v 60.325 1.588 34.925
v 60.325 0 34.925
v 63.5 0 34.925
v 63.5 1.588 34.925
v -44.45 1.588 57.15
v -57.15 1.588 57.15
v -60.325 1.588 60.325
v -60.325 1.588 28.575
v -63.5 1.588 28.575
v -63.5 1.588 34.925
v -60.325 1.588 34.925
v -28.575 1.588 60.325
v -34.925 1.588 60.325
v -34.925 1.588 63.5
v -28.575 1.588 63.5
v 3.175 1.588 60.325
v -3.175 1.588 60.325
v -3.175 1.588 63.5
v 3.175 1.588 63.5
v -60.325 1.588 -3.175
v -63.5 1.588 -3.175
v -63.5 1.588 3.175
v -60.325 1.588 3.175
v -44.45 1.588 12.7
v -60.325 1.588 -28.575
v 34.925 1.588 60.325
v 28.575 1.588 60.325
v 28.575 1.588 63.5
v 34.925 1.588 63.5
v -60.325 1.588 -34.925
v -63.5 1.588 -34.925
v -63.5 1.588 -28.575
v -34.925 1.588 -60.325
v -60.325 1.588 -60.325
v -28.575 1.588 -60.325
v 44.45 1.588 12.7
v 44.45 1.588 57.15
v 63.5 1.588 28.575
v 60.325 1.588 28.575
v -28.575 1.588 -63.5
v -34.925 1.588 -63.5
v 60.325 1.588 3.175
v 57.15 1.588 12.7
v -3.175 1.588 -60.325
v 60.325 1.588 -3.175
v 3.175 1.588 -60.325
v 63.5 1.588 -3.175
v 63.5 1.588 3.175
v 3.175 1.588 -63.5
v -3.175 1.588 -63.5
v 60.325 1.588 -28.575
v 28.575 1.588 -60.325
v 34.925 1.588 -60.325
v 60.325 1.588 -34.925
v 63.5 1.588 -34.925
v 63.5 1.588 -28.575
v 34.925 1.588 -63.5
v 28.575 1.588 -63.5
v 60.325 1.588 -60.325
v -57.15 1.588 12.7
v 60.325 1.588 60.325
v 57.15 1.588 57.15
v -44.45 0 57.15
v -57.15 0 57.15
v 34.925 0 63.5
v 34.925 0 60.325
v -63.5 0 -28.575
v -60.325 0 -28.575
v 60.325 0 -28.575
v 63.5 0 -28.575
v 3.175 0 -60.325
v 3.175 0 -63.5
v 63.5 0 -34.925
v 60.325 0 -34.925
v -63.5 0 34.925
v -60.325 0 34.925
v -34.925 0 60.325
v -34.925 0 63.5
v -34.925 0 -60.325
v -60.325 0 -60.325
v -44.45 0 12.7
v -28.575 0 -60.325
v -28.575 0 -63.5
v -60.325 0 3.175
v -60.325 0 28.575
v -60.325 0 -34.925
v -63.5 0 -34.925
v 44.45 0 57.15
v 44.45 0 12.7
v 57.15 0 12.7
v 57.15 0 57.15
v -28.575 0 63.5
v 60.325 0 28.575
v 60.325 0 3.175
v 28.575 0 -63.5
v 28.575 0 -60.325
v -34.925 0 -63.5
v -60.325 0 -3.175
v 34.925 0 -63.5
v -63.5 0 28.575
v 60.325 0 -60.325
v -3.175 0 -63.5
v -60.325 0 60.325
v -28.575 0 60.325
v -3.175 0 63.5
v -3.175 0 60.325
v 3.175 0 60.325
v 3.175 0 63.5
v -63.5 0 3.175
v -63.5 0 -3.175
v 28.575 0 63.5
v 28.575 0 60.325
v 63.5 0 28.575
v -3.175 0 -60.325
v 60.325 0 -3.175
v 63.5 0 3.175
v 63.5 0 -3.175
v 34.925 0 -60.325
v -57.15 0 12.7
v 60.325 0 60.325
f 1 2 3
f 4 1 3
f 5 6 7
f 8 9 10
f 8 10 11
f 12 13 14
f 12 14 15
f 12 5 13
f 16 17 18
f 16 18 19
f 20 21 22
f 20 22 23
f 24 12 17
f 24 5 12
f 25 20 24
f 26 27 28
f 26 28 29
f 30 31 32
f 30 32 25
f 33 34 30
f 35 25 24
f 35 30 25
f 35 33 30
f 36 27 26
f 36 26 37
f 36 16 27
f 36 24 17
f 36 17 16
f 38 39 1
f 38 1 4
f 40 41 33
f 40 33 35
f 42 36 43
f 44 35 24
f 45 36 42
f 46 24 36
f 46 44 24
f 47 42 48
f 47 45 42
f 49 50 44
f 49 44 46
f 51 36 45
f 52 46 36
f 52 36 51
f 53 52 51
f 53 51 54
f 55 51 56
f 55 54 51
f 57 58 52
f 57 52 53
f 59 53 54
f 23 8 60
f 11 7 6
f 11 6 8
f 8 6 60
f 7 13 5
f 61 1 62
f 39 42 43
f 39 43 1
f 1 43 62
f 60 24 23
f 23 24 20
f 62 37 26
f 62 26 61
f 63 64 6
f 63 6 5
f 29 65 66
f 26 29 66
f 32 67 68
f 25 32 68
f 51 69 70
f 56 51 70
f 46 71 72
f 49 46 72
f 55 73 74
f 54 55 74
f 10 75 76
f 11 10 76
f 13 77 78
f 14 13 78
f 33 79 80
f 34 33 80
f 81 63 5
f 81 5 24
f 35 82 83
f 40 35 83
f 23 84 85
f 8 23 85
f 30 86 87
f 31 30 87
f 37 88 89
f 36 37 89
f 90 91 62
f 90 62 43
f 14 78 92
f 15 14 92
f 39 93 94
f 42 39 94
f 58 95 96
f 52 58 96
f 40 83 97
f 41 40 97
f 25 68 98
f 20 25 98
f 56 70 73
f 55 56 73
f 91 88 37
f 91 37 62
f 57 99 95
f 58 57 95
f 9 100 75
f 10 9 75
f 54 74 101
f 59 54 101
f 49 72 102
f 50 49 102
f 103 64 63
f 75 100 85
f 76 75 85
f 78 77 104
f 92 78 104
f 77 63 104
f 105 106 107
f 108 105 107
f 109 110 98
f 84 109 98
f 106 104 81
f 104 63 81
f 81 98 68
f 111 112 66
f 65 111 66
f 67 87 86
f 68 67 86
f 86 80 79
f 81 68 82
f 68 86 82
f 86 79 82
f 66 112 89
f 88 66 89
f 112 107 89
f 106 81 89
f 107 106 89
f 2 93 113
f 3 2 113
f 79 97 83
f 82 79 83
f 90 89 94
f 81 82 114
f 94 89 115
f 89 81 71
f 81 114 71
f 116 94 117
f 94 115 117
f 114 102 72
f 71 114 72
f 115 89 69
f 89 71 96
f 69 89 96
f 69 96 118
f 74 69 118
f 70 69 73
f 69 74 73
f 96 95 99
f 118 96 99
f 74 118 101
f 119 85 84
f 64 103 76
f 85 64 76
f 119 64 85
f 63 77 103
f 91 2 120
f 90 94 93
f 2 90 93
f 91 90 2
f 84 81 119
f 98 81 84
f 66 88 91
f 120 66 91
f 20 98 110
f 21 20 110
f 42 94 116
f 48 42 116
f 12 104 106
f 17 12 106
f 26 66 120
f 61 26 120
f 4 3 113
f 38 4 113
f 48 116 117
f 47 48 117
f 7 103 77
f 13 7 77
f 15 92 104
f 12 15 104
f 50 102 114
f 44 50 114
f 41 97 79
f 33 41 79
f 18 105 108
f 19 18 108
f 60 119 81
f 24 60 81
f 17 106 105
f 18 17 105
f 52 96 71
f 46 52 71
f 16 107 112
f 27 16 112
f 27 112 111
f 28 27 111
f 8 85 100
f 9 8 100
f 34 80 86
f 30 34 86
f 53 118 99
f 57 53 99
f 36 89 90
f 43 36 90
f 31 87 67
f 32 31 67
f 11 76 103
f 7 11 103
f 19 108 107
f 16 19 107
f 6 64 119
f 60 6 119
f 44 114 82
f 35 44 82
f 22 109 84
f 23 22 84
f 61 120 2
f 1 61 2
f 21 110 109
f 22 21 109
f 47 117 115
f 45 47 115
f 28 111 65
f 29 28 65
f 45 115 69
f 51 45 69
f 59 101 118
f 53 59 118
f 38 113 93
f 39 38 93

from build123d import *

# Parameters (mm, degrees)
SKETCH1_W           = 12.7
SKETCH1_H           = 44.45
BOSS_EXTRUDE1_DEPTH = 1.5875


with BuildPart() as part:
    # Sketch1 → Boss-Extrude1 (new body)
    with BuildSketch(Plane(origin=(0, 0, 0), x_dir=(1, 0, 0), z_dir=(0, 1, 0))):
        Polygon((3.175, 63.5), (-3.175, 63.5), (-3.175, 60.325), (-28.575, 60.325), (-28.575, 63.5), (-34.925, 63.5), (-34.925, 60.325), (-60.325, 60.325), (-60.325, 34.925), (-63.5, 34.925), (-63.5, 28.575), (-60.325, 28.575), (-60.325, 3.175), (-63.5, 3.175), (-63.5, -3.175), (-60.325, -3.175), (-60.325, -28.575), (-63.5, -28.575), (-63.5, -34.925), (-60.325, -34.925), (-60.325, -60.325), (-34.925, -60.325), (-34.925, -63.5), (-28.575, -63.5), (-28.575, -60.325), (-3.175, -60.325), (-3.175, -63.5), (3.175, -63.5), (3.175, -60.325), (28.575, -60.325), (28.575, -63.5), (34.925, -63.5), (34.925, -60.325), (60.325, -60.325), (60.325, -34.925), (63.5, -34.925), (63.5, -28.575), (60.325, -28.575), (60.325, -3.175), (63.5, -3.175), (63.5, 3.175), (60.325, 3.175), (60.325, 28.575), (63.5, 28.575), (63.5, 34.925), (60.325, 34.925), (60.325, 60.325), (34.925, 60.325), (34.925, 63.5), (28.575, 63.5), (28.575, 60.325), (3.175, 60.325), align=None)
        with Locations((50.8, -34.925)):
            Rectangle(SKETCH1_W, SKETCH1_H, mode=Mode.SUBTRACT)
        with Locations((-50.8, -34.925)):
            Rectangle(SKETCH1_W, SKETCH1_H, mode=Mode.SUBTRACT)
    extrude(amount=BOSS_EXTRUDE1_DEPTH)


solid = part.part
